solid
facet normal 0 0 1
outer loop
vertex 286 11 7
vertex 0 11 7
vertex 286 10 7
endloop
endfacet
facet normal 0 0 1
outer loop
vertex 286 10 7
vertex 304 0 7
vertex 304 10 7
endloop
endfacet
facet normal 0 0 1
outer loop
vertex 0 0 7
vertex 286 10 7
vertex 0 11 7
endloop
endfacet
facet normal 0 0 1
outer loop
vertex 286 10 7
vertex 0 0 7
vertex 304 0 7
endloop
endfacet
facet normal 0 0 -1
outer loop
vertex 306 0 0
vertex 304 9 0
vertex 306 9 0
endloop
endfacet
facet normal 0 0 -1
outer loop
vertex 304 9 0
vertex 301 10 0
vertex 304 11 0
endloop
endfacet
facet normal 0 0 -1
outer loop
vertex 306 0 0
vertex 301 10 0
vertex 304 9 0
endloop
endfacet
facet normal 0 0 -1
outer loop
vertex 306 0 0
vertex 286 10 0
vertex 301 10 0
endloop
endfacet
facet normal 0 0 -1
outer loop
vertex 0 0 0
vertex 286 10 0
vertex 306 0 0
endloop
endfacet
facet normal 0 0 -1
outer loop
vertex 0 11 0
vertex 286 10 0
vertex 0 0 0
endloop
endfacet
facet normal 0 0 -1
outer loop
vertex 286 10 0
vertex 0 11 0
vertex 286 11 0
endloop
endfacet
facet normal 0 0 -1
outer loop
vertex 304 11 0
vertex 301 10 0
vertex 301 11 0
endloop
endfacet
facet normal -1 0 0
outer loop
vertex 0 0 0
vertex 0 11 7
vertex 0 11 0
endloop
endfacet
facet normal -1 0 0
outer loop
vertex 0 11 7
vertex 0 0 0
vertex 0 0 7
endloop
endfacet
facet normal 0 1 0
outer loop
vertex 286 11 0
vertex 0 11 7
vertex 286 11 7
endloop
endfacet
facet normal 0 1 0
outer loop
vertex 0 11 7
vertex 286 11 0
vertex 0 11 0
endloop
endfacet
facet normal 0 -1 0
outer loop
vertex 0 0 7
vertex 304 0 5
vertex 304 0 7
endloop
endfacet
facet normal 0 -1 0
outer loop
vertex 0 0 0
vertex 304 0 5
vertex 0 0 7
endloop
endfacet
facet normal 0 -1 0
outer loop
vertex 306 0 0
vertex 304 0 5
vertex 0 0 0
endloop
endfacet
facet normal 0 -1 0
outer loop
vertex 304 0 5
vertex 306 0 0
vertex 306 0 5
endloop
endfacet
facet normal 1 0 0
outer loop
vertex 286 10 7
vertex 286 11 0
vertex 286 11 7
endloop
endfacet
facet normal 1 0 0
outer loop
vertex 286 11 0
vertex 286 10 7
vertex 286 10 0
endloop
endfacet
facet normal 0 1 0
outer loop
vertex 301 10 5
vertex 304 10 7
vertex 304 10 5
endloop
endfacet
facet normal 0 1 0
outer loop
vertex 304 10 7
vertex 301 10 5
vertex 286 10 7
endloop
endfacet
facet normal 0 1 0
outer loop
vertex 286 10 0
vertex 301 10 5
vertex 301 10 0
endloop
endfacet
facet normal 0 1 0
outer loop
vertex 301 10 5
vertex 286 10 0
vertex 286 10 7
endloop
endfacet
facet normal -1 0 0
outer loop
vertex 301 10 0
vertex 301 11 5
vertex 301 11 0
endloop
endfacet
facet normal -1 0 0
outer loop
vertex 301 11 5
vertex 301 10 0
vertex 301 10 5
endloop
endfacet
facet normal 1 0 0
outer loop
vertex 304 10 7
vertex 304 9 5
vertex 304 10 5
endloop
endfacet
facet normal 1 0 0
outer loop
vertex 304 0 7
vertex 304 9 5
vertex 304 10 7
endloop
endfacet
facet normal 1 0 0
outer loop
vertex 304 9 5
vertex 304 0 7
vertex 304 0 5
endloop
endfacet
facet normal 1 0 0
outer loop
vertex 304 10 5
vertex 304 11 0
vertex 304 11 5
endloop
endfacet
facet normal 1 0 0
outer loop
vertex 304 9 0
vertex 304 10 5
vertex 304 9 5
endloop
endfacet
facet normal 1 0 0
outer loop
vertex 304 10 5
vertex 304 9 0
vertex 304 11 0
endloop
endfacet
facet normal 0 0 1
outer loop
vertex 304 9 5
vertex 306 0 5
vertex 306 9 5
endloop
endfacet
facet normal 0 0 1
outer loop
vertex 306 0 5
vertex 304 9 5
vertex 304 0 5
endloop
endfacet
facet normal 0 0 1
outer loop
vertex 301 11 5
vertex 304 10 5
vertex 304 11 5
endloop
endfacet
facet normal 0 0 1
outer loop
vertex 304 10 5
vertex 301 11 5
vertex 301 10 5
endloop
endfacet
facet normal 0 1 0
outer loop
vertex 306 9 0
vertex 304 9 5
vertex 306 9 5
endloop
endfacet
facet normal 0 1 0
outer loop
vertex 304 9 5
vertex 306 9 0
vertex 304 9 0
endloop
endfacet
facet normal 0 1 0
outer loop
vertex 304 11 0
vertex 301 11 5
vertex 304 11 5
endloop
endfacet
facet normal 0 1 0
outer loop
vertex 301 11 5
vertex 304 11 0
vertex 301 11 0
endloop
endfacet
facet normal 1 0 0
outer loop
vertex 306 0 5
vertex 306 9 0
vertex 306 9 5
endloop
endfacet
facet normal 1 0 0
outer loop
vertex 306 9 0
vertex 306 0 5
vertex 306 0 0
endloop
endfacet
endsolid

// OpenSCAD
translate([6.5, 5.5, 3.5]) color([0.0856157398333921, 0.2411443971002879, 0.8262650576639278]) cube([13, 11, 7], center=true);
translate([19.5, 5.5, 3.5]) color([0.15379567752788093, 0.8842528530898255, 0.2134665283608419]) cube([13, 11, 7], center=true);
translate([32.5, 5.5, 3.5]) color([0.6127566924478359, 0.818008657000479, 0.5590112191053322]) cube([13, 11, 7], center=true);
translate([45.5, 5.5, 3.5]) color([0.8866043301622452, 0.39447102725022787, 0.9589163376419946]) cube([13, 11, 7], center=true);
translate([58.5, 5.5, 3.5]) color([0.24972819156954773, 0.22005049979750413, 0.8404590105346786]) cube([13, 11, 7], center=true);
translate([71.5, 5.5, 3.5]) color([0.2789960200671917, 0.35210354864297055, 0.9946691500756418]) cube([13, 11, 7], center=true);
translate([84.5, 5.5, 3.5]) color([0.10728537706325991, 0.8996256313138141, 0.6100819970747507]) cube([13, 11, 7], center=true);
translate([97.5, 5.5, 3.5]) color([0.7890377134172993, 0.7110679469752405, 0.7774643558396669]) cube([13, 11, 7], center=true);
translate([110.5, 5.5, 3.5]) color([0.5140354678382717, 0.46207744282607, 0.6343562920465169]) cube([13, 11, 7], center=true);
translate([123.5, 5.5, 3.5]) color([0.27254621857246664, 0.016558424522952975, 0.6148716567717017]) cube([13, 11, 7], center=true);
translate([136.5, 5.5, 3.5]) color([0.7119066573597548, 0.17257617960039529, 0.41465974039415787]) cube([13, 11, 7], center=true);
translate([149.5, 5.5, 3.5]) color([0.21806470516739018, 0.8797884787327306, 0.9971497033508181]) cube([13, 11, 7], center=true);
translate([162.5, 5.5, 3.5]) color([0.006439244314443648, 0.5355241113549698, 0.428269623660265]) cube([13, 11, 7], center=true);
translate([175.5, 5.5, 3.5]) color([0.0497703561320445, 0.3846945959716809, 0.27248481749180187]) cube([13, 11, 7], center=true);
translate([188.5, 5.5, 3.5]) color([0.9711494351721061, 0.5646669518865992, 0.22956269737245216]) cube([13, 11, 7], center=true);
translate([201.5, 5.5, 3.5]) color([0.7165492601952248, 0.5466375027642284, 0.2821670936164109]) cube([13, 11, 7], center=true);
translate([214.5, 5.5, 3.5]) color([0.7398695784196249, 0.9015687423954613, 0.06478718309218656]) cube([13, 11, 7], center=true);
translate([223.5, 5.5, 3.5]) color([0.3075184499818515, 0.32730937178137276, 0.373196919474838]) cube([5, 11, 7], center=true);
translate([228.5, 5.5, 3.5]) color([0.48026967262350795, 0.5820603979481933, 0.1372879505883815]) cube([5, 11, 7], center=true);
translate([233.5, 5.5, 3.5]) color([0.015498761483451418, 0.5048497045627587, 0.36698725510709684]) cube([5, 11, 7], center=true);
translate([238.5, 5.5, 3.5]) color([0.6348155217266559, 0.811995686067811, 0.8768405645756486]) cube([5, 11, 7], center=true);
translate([243.5, 5.5, 3.5]) color([0.1552431358080847, 0.1767648869043179, 0.991228648099722]) cube([5, 11, 7], center=true);
translate([248.5, 5.5, 3.5]) color([0.13558077637136434, 0.20650423900368708, 0.9151210693627757]) cube([5, 11, 7], center=true);
translate([253.5, 5.5, 3.5]) color([0.49673738754911745, 0.7672539256192649, 0.969306850533619]) cube([5, 11, 7], center=true);
translate([258.5, 5.5, 3.5]) color([0.23531586477578126, 0.13212860983739783, 0.23368957459901674]) cube([5, 11, 7], center=true);
translate([263.5, 5.5, 3.5]) color([0.38460662479298113, 0.6084990843462054, 0.1325407149567407]) cube([5, 11, 7], center=true);
translate([268.5, 5.5, 3.5]) color([0.4984659545183915, 0.9178662904203972, 0.6160167741323543]) cube([5, 11, 7], center=true);
translate([273.5, 5.5, 3.5]) color([0.02601445858505036, 0.596125612844632, 0.48919913512172475]) cube([5, 11, 7], center=true);
translate([278.5, 5.5, 3.5]) color([0.30869925031539414, 0.9586301909392594, 0.5555224541780607]) cube([5, 11, 7], center=true);
translate([283.5, 5.5, 3.5]) color([0.16303723797834868, 0.8790785483620981, 0.8092366229990562]) cube([5, 11, 7], center=true);
translate([287.5, 2.5, 3.5]) color([0.7373715302416316, 0.5460288399006699, 0.7042240787132147]) cube([3, 5, 7], center=true);
translate([287.5, 7.5, 3.5]) color([0.07877233817546292, 0.13744427713979768, 0.40185422229333856]) cube([3, 5, 7], center=true);
translate([290.5, 2.5, 3.5]) color([0.1910666288561843, 0.31642065037316636, 0.2917281417853558]) cube([3, 5, 7], center=true);
translate([290.5, 7.5, 3.5]) color([0.9437754009602987, 0.20866341172373193, 0.3151573145870893]) cube([3, 5, 7], center=true);
translate([293.5, 2.5, 3.5]) color([0.7470721078045024, 0.24960896628473228, 0.8629627260654799]) cube([3, 5, 7], center=true);
translate([293.5, 7.5, 3.5]) color([0.6684326881602258, 0.6597695027130189, 0.22591717735012307]) cube([3, 5, 7], center=true);
translate([296.5, 2.5, 3.5]) color([0.3441717078654829, 0.16233220178561225, 0.01697652307419406]) cube([3, 5, 7], center=true);
translate([296.5, 7.5, 3.5]) color([0.5735931064152219, 0.05818297514553228, 0.6304378073753134]) cube([3, 5, 7], center=true);
translate([299.5, 2.5, 3.5]) color([0.35341956482818127, 0.49110709598533775, 0.06132304686728618]) cube([3, 5, 7], center=true);
translate([299.5, 7.5, 3.5]) color([0.24146702174069912, 0.012441234482642782, 0.9455344576677447]) cube([3, 5, 7], center=true);
translate([302.5, 2.5, 3.5]) color([0.3266678829978785, 0.820956849026723, 0.34492851027915805]) cube([3, 5, 7], center=true);
translate([302.5, 6.0, 2.5]) color([0.6639756368298299, 0.13585073420724958, 0.9219835342207869]) cube([3, 2, 5], center=true);
translate([302.5, 8.0, 2.5]) color([0.44896684911260887, 0.1420549627992148, 0.3119518323014343]) cube([3, 2, 5], center=true);
translate([302.5, 10.0, 2.5]) color([0.6490756968320398, 0.7280642389267371, 0.7852833252199665]) cube([3, 2, 5], center=true);
translate([302.5, 7.5, 6.0]) color([0.40863068686923587, 0.009633238682779877, 0.8909238596539266]) cube([3, 5, 2], center=true);
translate([305.0, 1.5, 2.5]) color([0.533705581213062, 0.8046005274030336, 0.9806276909012095]) cube([2, 3, 5], center=true);
translate([305.0, 4.5, 2.5]) color([0.7049346898693578, 0.7590860206033218, 0.5647284680717275]) cube([2, 3, 5], center=true);
translate([305.0, 7.5, 2.5]) color([0.12259546226958773, 0.9539533584587191, 0.1713156178825357]) cube([2, 3, 5], center=true);
